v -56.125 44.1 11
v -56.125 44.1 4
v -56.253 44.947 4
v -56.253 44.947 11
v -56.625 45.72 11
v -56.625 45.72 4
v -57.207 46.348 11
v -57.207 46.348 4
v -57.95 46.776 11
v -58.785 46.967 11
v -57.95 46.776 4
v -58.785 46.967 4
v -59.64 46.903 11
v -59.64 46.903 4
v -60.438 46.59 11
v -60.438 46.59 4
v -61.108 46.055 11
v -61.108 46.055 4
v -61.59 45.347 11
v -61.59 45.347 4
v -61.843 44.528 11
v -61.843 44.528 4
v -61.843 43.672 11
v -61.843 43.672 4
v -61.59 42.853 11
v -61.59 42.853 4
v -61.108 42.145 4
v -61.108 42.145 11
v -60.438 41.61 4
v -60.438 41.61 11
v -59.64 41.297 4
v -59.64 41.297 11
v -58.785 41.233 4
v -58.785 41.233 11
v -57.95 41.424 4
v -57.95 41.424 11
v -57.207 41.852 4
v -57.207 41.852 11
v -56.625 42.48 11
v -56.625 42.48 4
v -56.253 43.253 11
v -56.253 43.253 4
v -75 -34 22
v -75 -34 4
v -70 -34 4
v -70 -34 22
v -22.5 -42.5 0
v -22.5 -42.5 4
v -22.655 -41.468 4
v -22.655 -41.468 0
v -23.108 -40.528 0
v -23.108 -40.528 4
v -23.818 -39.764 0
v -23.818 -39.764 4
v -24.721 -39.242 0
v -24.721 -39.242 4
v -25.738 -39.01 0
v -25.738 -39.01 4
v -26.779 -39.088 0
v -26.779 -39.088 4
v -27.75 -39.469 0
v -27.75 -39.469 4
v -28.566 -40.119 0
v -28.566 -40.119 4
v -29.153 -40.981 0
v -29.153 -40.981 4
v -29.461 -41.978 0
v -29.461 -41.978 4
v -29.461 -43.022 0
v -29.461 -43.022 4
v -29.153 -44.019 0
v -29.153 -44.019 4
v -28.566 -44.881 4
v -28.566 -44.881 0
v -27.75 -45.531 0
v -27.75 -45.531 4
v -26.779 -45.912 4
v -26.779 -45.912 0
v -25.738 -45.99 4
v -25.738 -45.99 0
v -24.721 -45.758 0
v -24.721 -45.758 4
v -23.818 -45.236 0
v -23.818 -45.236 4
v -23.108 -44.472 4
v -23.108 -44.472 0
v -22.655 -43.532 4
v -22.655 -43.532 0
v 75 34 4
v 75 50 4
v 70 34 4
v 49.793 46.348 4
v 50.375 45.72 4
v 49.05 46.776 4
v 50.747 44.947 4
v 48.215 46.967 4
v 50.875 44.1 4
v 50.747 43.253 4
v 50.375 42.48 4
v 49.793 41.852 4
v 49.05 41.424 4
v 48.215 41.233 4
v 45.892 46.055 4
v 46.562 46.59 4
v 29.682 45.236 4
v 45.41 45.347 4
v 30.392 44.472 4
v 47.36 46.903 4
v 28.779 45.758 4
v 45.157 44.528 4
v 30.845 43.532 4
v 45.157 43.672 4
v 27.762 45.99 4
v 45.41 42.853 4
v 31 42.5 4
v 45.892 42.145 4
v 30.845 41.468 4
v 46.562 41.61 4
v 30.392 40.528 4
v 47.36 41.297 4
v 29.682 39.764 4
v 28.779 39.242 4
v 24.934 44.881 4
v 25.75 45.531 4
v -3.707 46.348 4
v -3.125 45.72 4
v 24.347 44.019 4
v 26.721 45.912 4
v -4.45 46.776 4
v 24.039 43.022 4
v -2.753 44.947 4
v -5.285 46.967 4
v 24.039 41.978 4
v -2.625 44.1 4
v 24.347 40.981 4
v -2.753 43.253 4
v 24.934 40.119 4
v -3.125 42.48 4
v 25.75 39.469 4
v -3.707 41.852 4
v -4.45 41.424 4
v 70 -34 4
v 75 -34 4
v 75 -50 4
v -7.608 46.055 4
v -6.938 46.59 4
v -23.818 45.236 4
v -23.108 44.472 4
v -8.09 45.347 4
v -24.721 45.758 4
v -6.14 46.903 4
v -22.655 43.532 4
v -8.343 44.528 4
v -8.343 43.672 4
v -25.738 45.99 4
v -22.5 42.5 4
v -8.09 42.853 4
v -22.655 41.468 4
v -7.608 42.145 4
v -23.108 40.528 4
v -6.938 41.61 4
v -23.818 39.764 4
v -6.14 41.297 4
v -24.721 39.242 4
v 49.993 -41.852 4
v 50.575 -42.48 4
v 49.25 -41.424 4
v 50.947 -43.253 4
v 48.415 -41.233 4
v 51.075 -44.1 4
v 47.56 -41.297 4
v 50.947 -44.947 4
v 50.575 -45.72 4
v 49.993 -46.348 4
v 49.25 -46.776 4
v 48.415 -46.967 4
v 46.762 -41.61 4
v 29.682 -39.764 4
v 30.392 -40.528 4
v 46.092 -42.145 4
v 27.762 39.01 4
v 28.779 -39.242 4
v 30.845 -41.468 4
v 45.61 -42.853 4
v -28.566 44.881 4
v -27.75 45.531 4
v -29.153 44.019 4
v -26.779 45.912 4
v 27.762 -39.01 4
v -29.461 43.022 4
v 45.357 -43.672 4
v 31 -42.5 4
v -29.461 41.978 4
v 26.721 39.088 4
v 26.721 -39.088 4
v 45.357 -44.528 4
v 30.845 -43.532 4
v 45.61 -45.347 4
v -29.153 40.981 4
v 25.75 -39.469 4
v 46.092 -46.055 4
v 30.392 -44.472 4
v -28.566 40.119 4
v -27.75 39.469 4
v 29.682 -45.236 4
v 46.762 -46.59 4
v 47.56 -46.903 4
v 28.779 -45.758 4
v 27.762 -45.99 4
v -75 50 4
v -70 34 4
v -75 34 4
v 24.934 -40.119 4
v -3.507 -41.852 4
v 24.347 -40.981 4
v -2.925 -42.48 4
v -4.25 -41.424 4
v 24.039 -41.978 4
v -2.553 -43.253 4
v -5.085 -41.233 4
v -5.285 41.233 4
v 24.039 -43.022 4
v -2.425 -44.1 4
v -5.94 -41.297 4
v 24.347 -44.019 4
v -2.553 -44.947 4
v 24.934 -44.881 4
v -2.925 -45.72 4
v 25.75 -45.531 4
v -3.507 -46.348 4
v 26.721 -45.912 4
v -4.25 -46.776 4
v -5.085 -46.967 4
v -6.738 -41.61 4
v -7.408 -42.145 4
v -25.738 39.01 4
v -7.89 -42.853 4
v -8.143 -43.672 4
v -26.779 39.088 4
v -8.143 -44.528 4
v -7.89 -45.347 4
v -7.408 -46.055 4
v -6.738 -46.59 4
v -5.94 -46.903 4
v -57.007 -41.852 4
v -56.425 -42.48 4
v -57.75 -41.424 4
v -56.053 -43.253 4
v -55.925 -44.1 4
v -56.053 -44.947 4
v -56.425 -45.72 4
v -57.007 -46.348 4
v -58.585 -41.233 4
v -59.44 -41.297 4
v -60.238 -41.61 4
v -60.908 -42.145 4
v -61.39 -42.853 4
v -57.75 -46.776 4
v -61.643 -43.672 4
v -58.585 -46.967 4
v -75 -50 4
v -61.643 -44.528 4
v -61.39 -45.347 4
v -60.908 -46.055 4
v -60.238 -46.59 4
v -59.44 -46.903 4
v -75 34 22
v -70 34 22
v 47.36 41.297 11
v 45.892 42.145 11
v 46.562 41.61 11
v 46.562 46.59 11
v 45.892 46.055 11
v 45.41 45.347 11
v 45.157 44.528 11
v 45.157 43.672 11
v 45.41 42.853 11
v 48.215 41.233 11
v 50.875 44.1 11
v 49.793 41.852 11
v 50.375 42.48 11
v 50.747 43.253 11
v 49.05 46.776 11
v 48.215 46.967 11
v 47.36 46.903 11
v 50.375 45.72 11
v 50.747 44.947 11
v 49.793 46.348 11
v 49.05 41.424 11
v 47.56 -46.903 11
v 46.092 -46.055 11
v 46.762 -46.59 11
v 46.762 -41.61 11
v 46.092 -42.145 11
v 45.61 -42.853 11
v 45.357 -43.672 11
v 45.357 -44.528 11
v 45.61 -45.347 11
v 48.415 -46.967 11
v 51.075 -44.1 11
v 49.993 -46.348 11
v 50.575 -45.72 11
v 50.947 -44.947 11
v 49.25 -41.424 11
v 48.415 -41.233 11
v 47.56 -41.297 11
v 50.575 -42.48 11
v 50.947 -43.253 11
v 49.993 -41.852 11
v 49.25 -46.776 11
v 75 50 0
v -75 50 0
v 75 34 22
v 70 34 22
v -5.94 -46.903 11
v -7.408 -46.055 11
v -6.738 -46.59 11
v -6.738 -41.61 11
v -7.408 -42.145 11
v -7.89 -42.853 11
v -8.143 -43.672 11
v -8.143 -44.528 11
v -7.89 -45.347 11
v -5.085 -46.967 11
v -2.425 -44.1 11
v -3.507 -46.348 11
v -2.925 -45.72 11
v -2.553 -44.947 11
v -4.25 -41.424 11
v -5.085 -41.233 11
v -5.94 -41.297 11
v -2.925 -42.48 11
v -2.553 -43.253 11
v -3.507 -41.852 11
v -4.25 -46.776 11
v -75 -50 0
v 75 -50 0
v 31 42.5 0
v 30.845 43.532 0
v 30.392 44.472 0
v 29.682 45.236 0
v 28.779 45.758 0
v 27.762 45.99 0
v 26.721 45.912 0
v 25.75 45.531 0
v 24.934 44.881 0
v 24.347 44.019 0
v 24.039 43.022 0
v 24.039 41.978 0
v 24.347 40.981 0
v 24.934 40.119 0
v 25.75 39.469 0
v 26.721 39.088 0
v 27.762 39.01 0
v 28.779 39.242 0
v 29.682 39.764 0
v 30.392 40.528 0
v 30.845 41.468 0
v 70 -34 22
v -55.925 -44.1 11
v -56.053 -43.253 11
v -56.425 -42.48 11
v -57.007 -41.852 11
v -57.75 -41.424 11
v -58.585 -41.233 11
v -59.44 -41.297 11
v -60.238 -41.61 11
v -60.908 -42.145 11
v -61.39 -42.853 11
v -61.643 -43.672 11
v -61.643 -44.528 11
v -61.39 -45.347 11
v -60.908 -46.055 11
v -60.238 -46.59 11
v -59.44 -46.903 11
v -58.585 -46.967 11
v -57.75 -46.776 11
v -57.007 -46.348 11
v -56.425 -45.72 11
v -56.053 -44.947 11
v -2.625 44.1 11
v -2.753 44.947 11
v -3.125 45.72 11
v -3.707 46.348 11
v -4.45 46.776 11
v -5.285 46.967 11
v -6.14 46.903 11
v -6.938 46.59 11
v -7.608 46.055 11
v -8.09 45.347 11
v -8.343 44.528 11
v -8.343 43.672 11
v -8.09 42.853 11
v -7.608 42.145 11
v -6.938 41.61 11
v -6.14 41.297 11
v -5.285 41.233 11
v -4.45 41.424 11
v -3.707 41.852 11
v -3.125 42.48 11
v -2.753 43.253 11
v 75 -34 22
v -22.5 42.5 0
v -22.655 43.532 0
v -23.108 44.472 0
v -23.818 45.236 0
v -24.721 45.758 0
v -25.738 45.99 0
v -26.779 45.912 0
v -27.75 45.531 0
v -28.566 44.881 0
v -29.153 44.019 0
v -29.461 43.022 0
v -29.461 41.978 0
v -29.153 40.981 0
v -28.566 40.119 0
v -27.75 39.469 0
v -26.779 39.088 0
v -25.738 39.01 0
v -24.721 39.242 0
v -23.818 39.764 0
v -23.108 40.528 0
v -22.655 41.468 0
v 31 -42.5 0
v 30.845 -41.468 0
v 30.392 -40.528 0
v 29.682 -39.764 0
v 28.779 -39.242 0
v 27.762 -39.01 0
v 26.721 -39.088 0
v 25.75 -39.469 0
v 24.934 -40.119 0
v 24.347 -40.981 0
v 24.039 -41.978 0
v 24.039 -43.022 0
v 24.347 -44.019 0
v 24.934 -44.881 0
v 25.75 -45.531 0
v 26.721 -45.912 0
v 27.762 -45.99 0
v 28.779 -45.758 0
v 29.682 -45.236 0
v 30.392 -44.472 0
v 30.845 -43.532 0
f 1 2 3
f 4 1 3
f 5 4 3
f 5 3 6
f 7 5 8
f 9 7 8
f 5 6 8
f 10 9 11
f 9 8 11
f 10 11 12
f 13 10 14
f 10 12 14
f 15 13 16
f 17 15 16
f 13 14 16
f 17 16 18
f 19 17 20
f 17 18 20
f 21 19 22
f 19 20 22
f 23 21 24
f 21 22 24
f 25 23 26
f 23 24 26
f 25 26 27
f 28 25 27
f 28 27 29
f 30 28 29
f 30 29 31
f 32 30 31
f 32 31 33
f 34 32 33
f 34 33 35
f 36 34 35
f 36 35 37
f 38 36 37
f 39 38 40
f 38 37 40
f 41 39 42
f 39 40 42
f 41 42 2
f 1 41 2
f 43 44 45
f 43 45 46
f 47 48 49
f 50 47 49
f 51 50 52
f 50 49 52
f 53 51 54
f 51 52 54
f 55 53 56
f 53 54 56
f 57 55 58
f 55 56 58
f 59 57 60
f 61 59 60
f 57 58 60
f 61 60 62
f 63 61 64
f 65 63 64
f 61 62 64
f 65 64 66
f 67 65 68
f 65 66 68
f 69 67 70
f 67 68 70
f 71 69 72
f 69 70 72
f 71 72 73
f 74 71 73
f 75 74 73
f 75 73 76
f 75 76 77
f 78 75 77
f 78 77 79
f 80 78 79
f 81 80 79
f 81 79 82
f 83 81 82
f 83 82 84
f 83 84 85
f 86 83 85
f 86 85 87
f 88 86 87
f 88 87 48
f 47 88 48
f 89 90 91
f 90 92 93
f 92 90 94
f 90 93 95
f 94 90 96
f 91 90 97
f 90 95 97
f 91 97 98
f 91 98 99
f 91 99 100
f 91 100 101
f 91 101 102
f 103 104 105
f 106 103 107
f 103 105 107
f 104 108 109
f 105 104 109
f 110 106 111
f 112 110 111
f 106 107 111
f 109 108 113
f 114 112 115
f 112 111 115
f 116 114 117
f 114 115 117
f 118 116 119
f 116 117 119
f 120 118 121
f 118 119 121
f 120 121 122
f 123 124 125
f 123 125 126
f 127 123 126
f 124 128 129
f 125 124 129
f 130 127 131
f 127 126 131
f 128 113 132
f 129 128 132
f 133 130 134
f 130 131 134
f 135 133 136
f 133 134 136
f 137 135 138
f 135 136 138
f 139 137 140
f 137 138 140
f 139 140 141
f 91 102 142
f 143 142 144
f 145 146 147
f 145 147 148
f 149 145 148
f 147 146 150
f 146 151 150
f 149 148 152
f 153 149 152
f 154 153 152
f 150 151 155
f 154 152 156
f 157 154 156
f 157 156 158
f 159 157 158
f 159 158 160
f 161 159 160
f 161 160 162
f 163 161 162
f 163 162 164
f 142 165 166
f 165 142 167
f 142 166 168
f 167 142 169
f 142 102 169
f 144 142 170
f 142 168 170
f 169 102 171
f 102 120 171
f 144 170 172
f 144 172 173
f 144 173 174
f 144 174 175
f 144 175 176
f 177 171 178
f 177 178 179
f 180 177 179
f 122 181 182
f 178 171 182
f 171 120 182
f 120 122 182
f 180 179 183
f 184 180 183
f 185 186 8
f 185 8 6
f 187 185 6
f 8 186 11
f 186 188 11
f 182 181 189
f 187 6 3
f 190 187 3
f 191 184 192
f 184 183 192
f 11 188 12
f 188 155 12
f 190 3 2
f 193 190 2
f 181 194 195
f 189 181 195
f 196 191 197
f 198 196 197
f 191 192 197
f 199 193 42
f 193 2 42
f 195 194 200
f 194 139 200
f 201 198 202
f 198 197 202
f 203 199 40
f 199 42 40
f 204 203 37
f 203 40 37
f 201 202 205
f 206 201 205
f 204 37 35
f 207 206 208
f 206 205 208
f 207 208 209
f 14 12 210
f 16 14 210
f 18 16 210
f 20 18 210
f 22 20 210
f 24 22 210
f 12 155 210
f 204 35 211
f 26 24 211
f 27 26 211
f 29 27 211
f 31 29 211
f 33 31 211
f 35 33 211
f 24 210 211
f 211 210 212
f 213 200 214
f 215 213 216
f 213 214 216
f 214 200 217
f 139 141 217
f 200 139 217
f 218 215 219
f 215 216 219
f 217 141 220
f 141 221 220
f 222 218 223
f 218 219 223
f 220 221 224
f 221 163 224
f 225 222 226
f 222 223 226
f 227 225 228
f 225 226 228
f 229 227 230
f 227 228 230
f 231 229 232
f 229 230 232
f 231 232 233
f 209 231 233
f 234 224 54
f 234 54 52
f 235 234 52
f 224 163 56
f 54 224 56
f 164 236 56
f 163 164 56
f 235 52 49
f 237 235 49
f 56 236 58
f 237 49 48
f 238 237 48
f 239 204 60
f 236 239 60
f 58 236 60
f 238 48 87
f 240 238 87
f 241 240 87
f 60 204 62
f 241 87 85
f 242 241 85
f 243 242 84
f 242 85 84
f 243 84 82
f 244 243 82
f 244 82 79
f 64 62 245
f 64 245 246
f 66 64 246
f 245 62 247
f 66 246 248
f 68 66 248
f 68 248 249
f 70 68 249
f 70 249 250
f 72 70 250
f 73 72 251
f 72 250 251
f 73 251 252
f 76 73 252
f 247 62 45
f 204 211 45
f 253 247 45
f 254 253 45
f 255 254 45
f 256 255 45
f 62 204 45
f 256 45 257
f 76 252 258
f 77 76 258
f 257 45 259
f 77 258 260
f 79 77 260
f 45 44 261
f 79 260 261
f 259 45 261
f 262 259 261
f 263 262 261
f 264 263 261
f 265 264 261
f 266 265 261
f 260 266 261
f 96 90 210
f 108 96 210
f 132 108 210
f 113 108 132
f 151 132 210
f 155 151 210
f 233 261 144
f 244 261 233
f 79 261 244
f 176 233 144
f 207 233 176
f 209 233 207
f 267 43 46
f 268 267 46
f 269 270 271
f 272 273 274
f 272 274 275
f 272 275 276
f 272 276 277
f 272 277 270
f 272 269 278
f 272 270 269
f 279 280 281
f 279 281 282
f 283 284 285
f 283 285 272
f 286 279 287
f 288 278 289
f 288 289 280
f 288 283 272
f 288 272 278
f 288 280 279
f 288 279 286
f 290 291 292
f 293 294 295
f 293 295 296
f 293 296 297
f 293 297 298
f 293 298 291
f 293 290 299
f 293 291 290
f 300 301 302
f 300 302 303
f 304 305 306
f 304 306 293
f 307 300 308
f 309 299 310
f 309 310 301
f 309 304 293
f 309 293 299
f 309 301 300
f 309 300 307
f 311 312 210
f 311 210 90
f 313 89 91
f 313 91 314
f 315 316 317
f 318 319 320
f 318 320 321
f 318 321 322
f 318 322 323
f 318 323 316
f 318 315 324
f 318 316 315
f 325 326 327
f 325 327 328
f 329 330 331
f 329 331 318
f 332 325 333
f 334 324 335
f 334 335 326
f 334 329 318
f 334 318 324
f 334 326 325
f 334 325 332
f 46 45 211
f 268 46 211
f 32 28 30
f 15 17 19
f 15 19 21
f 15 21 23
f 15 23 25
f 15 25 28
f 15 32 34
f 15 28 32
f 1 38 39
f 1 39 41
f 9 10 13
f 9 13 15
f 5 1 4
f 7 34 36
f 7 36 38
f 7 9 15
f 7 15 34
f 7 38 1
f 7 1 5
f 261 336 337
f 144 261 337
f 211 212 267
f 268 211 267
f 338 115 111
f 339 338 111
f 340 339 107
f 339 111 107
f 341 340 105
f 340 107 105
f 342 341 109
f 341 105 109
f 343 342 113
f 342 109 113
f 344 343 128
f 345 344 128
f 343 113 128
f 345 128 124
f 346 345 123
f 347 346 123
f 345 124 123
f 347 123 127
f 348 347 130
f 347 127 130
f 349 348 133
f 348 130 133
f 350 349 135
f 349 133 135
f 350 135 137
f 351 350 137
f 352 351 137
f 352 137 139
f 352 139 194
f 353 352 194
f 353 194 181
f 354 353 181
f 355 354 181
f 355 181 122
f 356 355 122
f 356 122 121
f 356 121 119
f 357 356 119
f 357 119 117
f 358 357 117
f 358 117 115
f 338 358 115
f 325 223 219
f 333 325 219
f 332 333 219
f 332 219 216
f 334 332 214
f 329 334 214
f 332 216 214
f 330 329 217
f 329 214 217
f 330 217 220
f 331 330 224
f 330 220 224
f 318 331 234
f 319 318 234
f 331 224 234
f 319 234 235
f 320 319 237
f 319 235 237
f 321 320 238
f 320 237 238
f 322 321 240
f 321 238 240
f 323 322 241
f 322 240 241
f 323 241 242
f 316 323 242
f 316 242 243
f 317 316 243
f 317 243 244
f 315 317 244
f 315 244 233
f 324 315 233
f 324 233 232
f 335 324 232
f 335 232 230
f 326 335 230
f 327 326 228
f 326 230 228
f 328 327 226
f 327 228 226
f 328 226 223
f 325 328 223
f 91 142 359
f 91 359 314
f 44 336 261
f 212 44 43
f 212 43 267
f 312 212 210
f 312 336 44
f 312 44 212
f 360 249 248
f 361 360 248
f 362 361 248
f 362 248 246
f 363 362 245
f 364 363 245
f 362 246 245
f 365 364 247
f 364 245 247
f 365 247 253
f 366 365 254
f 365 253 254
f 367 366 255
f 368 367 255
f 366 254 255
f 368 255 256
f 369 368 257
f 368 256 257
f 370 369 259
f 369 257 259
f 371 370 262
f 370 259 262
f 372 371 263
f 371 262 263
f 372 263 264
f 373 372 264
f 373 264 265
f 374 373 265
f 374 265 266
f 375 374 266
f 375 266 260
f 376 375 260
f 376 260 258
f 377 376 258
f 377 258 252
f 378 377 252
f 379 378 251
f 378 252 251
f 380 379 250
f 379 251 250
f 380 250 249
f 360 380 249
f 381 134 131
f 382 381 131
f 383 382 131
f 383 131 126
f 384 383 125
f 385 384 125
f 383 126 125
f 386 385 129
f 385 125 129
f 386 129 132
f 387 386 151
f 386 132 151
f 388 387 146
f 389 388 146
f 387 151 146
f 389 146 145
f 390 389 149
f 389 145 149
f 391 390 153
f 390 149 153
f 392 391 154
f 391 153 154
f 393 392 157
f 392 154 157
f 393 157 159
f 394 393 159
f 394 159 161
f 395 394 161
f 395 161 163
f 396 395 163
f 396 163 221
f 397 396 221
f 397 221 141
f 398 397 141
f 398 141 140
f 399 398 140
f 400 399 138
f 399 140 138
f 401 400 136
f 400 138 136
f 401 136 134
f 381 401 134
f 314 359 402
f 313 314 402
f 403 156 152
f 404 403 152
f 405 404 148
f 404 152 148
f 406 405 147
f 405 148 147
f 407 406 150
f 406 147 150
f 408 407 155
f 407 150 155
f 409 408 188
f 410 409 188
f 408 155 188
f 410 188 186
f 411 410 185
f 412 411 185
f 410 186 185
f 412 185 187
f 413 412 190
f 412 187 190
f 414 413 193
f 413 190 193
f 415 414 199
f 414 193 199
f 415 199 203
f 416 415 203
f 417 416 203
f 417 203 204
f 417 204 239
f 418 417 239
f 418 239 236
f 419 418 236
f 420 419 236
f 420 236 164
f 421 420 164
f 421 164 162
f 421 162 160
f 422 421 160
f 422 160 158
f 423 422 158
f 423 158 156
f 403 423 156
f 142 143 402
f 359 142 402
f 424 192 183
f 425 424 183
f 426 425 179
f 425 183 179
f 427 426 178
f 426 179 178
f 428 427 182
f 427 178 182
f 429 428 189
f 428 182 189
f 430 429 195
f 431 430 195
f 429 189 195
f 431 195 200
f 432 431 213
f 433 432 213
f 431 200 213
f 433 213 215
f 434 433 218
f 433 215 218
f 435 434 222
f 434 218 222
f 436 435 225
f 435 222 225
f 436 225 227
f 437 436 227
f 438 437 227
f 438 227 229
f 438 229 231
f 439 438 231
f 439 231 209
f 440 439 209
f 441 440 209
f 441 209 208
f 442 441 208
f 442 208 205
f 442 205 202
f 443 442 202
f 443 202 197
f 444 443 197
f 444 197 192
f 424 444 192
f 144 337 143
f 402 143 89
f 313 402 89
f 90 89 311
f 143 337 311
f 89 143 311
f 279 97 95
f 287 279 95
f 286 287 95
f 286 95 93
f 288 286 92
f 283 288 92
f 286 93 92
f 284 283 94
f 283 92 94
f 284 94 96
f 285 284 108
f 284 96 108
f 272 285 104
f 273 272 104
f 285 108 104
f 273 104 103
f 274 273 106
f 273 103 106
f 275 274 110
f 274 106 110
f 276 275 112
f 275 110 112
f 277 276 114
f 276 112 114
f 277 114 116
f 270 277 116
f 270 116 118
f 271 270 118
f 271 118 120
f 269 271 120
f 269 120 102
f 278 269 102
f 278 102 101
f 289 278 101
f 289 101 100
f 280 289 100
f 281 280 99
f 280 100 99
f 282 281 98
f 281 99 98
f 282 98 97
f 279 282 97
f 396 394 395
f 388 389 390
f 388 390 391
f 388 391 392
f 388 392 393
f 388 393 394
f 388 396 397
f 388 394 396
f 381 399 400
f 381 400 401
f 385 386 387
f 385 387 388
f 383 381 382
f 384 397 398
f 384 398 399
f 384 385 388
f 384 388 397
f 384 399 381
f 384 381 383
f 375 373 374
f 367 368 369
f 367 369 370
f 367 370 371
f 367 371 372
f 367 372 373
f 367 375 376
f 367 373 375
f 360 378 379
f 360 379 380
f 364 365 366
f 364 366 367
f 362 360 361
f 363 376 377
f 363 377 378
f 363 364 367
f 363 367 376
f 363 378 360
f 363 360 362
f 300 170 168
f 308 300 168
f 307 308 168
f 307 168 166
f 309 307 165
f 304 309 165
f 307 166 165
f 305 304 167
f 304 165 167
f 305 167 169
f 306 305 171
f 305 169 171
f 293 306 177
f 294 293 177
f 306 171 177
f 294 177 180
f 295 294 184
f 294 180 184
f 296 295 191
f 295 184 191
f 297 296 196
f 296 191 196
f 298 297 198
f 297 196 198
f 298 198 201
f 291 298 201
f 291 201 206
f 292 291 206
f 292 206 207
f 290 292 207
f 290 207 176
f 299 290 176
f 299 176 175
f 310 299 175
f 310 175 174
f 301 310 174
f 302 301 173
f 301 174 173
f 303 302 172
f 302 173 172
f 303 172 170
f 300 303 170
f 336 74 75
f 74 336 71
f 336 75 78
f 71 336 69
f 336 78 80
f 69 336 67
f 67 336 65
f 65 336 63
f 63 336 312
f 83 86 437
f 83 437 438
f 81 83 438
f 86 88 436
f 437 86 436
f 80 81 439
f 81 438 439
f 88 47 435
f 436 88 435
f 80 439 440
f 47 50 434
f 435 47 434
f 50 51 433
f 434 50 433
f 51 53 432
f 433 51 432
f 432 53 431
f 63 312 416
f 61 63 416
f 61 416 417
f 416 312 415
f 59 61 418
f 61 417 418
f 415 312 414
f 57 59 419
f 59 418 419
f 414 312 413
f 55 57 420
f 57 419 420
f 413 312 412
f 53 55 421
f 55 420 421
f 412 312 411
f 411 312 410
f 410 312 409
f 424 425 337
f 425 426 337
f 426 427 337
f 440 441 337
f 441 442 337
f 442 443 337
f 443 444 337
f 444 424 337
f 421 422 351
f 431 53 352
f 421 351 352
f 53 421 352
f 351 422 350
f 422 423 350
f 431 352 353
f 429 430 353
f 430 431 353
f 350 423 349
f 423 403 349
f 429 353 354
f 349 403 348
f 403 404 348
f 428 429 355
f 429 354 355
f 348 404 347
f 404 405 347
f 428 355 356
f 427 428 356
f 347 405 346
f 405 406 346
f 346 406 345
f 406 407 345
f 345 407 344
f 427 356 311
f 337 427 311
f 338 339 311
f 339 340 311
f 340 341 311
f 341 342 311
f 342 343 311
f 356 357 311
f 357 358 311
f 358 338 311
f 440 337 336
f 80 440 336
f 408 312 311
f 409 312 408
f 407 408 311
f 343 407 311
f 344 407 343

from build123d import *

# Parameters (mm, degrees)
SKETCH_W        = 150
SKETCH_H        = 100
PAD_DEPTH       = 4
SKETCH005_W     = 5
SKETCH005_H     = 100
PAD001_DEPTH    = 18
SKETCH007_R     = 3.5
POCKET001_DEPTH = 5
SKETCH006_R     = 2.875
PAD002_DEPTH    = 7
SKETCH008_W     = 16
SKETCH008_H     = 18
POCKET_DEPTH    = 5
SKETCH009_W     = 16
SKETCH009_H     = 18
POCKET002_DEPTH = 5


with BuildPart() as part:
    # Sketch → Pad (new body)
    with BuildSketch(Plane.XY):
        Rectangle(SKETCH_W, SKETCH_H)
    extrude(amount=PAD_DEPTH)

    # Sketch005 → Pad001 (join)
    with BuildSketch(Plane.XY.offset(4)):
        with Locations((-72.5, 0)):
            Rectangle(SKETCH005_W, SKETCH005_H)
        with Locations((72.5, 0)):
            Rectangle(SKETCH005_W, SKETCH005_H)
    extrude(amount=PAD001_DEPTH)

    # Sketch007 → Pocket001 (cut)
    with BuildSketch(Plane.XY.offset(4)):
        with Locations((-26, 42.5)):
            Circle(SKETCH007_R)
        with Locations((27.5, 42.5)):
            Circle(SKETCH007_R)
        with Locations((27.5, -42.5)):
            Circle(SKETCH007_R)
        with Locations((-26, -42.5)):
            Circle(SKETCH007_R)
    extrude(amount=-POCKET001_DEPTH, mode=Mode.SUBTRACT)

    # Sketch006 (on Face6 of Pad001) → Pad002 (join)
    with BuildSketch(Plane.XY.offset(4)):
        with Locations((-59, 44.1)):
            Circle(SKETCH006_R)
        with Locations((-5.5, 44.1)):
            Circle(SKETCH006_R)
        with Locations((48, 44.1)):
            Circle(SKETCH006_R)
        with Locations((48.2, -44.1)):
            Circle(SKETCH006_R)
        with Locations((-5.3, -44.1)):
            Circle(SKETCH006_R)
        with Locations((-58.8, -44.1)):
            Circle(SKETCH006_R)
    extrude(amount=PAD002_DEPTH)

    # Sketch008 (on Face9 of Pad002) → Pocket (cut)
    with BuildSketch(Plane(origin=(-75, 0, 0), x_dir=(0, -1, 0), z_dir=(-1, 0, 0))):
        with Locations((-42, 13)):
            Rectangle(SKETCH008_W, SKETCH008_H)
        with Locations((42, 13)):
            Rectangle(SKETCH008_W, SKETCH008_H)
    extrude(amount=-POCKET_DEPTH, mode=Mode.SUBTRACT)

    # Sketch009 (on Face11 of Pocket) → Pocket002 (cut)
    with BuildSketch(Plane.YZ.offset(75)):
        with Locations((42, 13)):
            Rectangle(SKETCH009_W, SKETCH009_H)
        with Locations((-42, 13)):
            Rectangle(SKETCH009_W, SKETCH009_H)
    extrude(amount=-POCKET002_DEPTH, mode=Mode.SUBTRACT)


solid = part.part
